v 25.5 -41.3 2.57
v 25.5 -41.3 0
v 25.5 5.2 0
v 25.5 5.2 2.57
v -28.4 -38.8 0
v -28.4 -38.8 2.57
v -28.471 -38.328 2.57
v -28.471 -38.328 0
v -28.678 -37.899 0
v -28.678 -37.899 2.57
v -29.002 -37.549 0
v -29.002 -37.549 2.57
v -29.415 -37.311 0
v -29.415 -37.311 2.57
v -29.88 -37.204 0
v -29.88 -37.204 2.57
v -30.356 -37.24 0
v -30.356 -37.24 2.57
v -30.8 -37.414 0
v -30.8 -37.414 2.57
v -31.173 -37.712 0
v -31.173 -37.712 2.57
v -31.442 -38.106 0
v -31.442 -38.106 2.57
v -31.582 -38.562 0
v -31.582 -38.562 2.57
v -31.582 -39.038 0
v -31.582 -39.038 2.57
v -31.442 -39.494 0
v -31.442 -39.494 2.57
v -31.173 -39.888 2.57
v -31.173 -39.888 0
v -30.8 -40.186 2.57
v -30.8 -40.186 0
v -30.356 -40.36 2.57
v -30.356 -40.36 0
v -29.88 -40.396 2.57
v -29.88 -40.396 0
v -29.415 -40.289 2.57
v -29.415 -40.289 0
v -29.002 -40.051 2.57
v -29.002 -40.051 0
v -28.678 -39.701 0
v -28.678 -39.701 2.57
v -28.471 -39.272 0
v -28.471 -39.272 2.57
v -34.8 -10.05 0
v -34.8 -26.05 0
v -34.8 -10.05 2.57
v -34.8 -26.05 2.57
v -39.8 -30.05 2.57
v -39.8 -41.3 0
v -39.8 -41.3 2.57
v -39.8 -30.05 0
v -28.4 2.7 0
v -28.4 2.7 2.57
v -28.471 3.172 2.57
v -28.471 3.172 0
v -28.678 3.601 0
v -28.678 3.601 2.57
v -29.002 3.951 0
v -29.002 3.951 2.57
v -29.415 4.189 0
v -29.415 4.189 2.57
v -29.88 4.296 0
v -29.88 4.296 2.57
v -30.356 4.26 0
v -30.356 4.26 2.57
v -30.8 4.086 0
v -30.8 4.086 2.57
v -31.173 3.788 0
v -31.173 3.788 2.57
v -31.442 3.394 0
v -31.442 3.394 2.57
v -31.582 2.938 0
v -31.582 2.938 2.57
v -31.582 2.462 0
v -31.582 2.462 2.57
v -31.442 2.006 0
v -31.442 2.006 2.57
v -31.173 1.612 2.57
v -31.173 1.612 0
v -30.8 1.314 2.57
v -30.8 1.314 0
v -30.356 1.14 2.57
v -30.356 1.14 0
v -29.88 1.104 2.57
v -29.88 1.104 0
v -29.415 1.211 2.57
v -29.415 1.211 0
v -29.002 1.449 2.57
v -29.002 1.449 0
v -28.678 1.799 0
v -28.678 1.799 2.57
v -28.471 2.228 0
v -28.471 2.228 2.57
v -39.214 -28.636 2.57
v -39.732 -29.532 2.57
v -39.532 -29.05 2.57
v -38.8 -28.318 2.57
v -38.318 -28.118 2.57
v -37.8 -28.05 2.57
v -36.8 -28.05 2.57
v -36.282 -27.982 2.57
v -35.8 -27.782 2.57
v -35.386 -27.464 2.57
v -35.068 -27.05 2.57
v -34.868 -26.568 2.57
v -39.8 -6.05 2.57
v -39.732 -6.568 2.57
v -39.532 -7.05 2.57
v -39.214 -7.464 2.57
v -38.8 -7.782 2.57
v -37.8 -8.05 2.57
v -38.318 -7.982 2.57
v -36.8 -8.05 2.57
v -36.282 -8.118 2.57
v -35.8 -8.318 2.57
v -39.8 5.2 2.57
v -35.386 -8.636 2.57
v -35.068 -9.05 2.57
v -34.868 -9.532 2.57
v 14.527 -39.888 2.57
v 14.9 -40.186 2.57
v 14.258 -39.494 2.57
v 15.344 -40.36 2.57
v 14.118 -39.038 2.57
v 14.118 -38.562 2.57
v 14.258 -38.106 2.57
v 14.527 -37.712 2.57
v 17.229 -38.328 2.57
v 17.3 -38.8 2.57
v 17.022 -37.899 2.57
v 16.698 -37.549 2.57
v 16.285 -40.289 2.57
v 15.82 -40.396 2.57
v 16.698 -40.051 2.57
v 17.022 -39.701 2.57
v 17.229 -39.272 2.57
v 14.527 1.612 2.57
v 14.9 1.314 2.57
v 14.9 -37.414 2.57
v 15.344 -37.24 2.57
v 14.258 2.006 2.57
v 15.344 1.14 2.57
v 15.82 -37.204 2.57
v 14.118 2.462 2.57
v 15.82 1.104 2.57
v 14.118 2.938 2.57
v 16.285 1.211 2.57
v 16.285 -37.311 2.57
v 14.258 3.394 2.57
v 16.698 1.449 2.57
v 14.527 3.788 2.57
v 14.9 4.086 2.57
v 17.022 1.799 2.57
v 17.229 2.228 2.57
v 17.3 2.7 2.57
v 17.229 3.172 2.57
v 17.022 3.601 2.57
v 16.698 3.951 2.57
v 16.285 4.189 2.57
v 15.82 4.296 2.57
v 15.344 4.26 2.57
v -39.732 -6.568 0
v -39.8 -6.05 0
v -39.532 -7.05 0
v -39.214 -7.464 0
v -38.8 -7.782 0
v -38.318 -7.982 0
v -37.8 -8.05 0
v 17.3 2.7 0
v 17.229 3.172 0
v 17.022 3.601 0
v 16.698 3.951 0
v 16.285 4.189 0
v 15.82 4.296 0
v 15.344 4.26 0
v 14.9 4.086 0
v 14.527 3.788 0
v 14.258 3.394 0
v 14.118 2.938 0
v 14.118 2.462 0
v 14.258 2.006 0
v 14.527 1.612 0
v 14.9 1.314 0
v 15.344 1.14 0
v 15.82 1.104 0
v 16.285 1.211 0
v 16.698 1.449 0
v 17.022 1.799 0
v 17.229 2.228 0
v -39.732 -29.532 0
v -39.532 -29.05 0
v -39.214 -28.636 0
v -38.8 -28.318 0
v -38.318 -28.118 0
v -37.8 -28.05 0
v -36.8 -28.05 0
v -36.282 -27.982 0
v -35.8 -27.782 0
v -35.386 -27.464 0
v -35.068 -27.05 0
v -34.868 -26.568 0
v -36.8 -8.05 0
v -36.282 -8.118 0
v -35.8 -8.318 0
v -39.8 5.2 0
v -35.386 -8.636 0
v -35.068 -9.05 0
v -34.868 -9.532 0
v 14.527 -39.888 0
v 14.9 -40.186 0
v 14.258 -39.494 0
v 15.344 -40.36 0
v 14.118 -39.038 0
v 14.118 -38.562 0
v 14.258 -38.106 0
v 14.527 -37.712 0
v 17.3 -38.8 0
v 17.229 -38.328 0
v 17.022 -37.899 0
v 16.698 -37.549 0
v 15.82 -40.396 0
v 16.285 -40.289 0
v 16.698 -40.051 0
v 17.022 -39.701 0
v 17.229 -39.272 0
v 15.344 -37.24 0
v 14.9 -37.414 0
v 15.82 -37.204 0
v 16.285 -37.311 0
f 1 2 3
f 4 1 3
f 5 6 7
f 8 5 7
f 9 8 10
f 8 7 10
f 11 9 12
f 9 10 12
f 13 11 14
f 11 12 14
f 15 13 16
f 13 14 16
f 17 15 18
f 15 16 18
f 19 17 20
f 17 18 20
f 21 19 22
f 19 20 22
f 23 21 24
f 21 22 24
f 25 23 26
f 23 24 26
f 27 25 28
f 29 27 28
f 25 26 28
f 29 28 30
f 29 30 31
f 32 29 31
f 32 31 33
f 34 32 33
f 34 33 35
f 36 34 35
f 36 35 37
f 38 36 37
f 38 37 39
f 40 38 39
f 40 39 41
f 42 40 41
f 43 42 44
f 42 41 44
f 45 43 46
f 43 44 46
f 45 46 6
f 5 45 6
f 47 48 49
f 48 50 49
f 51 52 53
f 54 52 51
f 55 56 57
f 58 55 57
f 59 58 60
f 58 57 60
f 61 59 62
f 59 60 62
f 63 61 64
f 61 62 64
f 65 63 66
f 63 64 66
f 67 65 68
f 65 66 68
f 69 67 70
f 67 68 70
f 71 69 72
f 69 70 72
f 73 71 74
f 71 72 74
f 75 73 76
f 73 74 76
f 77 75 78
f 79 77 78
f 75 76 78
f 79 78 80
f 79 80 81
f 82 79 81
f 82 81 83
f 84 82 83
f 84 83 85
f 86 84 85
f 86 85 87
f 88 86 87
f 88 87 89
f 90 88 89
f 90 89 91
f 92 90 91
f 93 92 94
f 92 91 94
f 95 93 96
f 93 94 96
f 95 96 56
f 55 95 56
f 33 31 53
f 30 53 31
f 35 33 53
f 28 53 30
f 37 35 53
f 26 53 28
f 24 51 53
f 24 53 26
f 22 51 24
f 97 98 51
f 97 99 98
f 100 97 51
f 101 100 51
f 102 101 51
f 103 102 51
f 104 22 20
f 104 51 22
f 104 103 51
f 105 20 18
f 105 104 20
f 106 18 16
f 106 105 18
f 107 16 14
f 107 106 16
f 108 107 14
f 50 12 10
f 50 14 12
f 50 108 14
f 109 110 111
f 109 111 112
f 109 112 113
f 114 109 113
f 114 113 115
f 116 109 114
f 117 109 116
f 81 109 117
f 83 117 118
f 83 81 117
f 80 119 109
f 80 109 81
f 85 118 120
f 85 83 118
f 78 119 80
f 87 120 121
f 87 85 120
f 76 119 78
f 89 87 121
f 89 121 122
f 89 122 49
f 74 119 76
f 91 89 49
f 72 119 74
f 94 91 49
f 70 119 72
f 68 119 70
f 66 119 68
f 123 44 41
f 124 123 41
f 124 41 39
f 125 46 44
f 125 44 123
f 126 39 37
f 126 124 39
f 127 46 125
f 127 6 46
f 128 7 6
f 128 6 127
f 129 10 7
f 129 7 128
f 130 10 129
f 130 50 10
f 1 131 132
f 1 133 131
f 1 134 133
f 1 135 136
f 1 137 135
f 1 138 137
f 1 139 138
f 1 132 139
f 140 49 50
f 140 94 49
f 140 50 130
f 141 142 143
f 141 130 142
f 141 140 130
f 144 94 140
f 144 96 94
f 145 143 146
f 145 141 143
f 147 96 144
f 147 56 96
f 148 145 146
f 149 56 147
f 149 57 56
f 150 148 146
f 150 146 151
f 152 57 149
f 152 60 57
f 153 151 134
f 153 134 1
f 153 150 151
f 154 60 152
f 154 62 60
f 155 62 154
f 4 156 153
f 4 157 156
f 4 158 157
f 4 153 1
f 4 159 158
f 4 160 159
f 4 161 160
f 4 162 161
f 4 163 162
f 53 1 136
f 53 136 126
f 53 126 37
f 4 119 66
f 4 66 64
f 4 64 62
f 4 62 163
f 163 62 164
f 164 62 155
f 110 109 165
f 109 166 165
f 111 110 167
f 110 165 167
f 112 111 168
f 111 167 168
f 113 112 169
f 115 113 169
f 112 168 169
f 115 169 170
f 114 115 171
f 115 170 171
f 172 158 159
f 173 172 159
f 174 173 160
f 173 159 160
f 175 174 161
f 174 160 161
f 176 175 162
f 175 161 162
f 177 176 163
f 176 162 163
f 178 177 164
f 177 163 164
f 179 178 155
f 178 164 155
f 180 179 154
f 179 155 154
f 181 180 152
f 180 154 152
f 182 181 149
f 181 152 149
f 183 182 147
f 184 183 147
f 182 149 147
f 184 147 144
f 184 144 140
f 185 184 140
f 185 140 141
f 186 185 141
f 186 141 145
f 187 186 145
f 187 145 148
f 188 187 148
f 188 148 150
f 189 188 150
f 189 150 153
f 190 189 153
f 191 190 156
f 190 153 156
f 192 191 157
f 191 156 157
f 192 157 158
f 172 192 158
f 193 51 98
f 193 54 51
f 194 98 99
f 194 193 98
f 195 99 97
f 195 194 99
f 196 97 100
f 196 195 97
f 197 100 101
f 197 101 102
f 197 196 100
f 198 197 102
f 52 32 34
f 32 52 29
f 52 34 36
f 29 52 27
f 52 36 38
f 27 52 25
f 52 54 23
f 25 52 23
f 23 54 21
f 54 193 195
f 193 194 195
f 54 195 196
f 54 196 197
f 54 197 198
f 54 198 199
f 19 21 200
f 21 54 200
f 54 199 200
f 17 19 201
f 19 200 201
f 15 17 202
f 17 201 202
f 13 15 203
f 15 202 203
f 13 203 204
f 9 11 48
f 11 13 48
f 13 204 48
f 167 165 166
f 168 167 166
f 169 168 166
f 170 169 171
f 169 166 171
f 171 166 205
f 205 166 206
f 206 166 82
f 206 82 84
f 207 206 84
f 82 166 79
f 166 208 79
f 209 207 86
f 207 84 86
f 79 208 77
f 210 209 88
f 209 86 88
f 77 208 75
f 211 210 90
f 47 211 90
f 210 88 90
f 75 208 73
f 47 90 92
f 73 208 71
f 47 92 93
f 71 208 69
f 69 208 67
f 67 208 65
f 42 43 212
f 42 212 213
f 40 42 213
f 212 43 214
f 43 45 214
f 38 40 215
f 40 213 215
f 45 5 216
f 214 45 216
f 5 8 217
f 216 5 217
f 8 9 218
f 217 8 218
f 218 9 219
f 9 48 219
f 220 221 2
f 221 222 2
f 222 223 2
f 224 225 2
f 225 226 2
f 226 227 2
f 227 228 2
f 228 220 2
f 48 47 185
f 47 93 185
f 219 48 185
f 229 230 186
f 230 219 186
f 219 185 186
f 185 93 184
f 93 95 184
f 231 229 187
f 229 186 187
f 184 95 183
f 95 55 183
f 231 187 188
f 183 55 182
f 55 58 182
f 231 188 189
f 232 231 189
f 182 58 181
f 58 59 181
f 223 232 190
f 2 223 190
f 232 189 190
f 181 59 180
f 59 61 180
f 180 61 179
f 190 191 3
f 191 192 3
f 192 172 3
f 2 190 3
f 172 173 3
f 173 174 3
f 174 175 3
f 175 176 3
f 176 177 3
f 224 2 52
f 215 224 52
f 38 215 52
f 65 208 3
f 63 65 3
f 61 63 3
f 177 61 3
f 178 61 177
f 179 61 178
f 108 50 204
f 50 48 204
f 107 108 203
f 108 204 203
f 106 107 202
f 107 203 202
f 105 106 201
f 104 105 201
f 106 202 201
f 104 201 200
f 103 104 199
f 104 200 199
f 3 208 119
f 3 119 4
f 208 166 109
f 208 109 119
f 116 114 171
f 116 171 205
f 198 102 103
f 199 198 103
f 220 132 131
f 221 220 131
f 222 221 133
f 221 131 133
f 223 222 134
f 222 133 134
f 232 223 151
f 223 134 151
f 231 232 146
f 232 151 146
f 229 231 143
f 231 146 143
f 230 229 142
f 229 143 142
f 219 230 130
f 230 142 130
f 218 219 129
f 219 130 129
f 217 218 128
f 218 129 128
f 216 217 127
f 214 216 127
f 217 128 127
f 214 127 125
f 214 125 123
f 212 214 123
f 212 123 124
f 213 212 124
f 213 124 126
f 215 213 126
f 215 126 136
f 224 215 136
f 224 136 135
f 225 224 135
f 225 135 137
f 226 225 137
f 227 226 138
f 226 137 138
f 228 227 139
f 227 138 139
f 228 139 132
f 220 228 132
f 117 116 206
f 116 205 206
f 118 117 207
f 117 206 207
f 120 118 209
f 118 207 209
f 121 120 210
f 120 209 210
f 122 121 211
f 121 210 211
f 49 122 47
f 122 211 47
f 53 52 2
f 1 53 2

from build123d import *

# Parameters (mm, degrees)
SKETCH1_W           = 65.3
SKETCH1_H           = 46.5
BOSS_EXTRUDE1_DEPTH = 2.57
SKETCH2_R           = 1.6
CUT_EXTRUDE2_DEPTH  = 2.57
SKETCH3_R           = 5
CUT_EXTRUDE3_DEPTH  = 2.57
SKETCH4_W           = 5
SKETCH4_H           = 20
CUT_EXTRUDE4_DEPTH  = 10
FILLET1_R           = 2


with BuildPart() as part:
    # Sketch1 → Boss-Extrude1 (new body)
    with BuildSketch(Plane.XY):
        with Locations((-7.15, -18.05)):
            Rectangle(SKETCH1_W, SKETCH1_H)
    extrude(amount=BOSS_EXTRUDE1_DEPTH)

    # Sketch2 → Cut-Extrude2 (cut)
    with BuildSketch(Plane.XY.offset(2.57)):
        with Locations((15.7, -38.8)):
            Circle(SKETCH2_R)
        with Locations((15.7, 2.7)):
            Circle(SKETCH2_R)
        with Locations((-30, 2.7)):
            Circle(SKETCH2_R)
        with Locations((-30, -38.8)):
            Circle(SKETCH2_R)
    extrude(amount=-CUT_EXTRUDE2_DEPTH, mode=Mode.SUBTRACT)

    # Sketch3 → Cut-Extrude3 (cut)
    with BuildSketch(Plane.XY.offset(2.57)):
        with Locations((-39.8, -18.05)):
            Circle(SKETCH3_R)
    extrude(amount=-CUT_EXTRUDE3_DEPTH, mode=Mode.SUBTRACT)

    # Sketch4 → Cut-Extrude4 (cut)
    with BuildSketch(Plane.XY.offset(2.57)):
        with Locations((-37.3, -18.05)):
            Rectangle(SKETCH4_W, SKETCH4_H)
    extrude(amount=-CUT_EXTRUDE4_DEPTH, mode=Mode.SUBTRACT)

    # Fillet1
    fillet1_edges = [part.edges().sort_by_distance(p)[0] for p in [
        (-39.8, -8.05, 1.285),
        (-34.8, -28.05, 1.285),
        (-39.8, -28.05, 1.285),
        (-34.8, -8.05, 1.285),
    ]]
    fillet(fillet1_edges, radius=FILLET1_R)


solid = part.part
